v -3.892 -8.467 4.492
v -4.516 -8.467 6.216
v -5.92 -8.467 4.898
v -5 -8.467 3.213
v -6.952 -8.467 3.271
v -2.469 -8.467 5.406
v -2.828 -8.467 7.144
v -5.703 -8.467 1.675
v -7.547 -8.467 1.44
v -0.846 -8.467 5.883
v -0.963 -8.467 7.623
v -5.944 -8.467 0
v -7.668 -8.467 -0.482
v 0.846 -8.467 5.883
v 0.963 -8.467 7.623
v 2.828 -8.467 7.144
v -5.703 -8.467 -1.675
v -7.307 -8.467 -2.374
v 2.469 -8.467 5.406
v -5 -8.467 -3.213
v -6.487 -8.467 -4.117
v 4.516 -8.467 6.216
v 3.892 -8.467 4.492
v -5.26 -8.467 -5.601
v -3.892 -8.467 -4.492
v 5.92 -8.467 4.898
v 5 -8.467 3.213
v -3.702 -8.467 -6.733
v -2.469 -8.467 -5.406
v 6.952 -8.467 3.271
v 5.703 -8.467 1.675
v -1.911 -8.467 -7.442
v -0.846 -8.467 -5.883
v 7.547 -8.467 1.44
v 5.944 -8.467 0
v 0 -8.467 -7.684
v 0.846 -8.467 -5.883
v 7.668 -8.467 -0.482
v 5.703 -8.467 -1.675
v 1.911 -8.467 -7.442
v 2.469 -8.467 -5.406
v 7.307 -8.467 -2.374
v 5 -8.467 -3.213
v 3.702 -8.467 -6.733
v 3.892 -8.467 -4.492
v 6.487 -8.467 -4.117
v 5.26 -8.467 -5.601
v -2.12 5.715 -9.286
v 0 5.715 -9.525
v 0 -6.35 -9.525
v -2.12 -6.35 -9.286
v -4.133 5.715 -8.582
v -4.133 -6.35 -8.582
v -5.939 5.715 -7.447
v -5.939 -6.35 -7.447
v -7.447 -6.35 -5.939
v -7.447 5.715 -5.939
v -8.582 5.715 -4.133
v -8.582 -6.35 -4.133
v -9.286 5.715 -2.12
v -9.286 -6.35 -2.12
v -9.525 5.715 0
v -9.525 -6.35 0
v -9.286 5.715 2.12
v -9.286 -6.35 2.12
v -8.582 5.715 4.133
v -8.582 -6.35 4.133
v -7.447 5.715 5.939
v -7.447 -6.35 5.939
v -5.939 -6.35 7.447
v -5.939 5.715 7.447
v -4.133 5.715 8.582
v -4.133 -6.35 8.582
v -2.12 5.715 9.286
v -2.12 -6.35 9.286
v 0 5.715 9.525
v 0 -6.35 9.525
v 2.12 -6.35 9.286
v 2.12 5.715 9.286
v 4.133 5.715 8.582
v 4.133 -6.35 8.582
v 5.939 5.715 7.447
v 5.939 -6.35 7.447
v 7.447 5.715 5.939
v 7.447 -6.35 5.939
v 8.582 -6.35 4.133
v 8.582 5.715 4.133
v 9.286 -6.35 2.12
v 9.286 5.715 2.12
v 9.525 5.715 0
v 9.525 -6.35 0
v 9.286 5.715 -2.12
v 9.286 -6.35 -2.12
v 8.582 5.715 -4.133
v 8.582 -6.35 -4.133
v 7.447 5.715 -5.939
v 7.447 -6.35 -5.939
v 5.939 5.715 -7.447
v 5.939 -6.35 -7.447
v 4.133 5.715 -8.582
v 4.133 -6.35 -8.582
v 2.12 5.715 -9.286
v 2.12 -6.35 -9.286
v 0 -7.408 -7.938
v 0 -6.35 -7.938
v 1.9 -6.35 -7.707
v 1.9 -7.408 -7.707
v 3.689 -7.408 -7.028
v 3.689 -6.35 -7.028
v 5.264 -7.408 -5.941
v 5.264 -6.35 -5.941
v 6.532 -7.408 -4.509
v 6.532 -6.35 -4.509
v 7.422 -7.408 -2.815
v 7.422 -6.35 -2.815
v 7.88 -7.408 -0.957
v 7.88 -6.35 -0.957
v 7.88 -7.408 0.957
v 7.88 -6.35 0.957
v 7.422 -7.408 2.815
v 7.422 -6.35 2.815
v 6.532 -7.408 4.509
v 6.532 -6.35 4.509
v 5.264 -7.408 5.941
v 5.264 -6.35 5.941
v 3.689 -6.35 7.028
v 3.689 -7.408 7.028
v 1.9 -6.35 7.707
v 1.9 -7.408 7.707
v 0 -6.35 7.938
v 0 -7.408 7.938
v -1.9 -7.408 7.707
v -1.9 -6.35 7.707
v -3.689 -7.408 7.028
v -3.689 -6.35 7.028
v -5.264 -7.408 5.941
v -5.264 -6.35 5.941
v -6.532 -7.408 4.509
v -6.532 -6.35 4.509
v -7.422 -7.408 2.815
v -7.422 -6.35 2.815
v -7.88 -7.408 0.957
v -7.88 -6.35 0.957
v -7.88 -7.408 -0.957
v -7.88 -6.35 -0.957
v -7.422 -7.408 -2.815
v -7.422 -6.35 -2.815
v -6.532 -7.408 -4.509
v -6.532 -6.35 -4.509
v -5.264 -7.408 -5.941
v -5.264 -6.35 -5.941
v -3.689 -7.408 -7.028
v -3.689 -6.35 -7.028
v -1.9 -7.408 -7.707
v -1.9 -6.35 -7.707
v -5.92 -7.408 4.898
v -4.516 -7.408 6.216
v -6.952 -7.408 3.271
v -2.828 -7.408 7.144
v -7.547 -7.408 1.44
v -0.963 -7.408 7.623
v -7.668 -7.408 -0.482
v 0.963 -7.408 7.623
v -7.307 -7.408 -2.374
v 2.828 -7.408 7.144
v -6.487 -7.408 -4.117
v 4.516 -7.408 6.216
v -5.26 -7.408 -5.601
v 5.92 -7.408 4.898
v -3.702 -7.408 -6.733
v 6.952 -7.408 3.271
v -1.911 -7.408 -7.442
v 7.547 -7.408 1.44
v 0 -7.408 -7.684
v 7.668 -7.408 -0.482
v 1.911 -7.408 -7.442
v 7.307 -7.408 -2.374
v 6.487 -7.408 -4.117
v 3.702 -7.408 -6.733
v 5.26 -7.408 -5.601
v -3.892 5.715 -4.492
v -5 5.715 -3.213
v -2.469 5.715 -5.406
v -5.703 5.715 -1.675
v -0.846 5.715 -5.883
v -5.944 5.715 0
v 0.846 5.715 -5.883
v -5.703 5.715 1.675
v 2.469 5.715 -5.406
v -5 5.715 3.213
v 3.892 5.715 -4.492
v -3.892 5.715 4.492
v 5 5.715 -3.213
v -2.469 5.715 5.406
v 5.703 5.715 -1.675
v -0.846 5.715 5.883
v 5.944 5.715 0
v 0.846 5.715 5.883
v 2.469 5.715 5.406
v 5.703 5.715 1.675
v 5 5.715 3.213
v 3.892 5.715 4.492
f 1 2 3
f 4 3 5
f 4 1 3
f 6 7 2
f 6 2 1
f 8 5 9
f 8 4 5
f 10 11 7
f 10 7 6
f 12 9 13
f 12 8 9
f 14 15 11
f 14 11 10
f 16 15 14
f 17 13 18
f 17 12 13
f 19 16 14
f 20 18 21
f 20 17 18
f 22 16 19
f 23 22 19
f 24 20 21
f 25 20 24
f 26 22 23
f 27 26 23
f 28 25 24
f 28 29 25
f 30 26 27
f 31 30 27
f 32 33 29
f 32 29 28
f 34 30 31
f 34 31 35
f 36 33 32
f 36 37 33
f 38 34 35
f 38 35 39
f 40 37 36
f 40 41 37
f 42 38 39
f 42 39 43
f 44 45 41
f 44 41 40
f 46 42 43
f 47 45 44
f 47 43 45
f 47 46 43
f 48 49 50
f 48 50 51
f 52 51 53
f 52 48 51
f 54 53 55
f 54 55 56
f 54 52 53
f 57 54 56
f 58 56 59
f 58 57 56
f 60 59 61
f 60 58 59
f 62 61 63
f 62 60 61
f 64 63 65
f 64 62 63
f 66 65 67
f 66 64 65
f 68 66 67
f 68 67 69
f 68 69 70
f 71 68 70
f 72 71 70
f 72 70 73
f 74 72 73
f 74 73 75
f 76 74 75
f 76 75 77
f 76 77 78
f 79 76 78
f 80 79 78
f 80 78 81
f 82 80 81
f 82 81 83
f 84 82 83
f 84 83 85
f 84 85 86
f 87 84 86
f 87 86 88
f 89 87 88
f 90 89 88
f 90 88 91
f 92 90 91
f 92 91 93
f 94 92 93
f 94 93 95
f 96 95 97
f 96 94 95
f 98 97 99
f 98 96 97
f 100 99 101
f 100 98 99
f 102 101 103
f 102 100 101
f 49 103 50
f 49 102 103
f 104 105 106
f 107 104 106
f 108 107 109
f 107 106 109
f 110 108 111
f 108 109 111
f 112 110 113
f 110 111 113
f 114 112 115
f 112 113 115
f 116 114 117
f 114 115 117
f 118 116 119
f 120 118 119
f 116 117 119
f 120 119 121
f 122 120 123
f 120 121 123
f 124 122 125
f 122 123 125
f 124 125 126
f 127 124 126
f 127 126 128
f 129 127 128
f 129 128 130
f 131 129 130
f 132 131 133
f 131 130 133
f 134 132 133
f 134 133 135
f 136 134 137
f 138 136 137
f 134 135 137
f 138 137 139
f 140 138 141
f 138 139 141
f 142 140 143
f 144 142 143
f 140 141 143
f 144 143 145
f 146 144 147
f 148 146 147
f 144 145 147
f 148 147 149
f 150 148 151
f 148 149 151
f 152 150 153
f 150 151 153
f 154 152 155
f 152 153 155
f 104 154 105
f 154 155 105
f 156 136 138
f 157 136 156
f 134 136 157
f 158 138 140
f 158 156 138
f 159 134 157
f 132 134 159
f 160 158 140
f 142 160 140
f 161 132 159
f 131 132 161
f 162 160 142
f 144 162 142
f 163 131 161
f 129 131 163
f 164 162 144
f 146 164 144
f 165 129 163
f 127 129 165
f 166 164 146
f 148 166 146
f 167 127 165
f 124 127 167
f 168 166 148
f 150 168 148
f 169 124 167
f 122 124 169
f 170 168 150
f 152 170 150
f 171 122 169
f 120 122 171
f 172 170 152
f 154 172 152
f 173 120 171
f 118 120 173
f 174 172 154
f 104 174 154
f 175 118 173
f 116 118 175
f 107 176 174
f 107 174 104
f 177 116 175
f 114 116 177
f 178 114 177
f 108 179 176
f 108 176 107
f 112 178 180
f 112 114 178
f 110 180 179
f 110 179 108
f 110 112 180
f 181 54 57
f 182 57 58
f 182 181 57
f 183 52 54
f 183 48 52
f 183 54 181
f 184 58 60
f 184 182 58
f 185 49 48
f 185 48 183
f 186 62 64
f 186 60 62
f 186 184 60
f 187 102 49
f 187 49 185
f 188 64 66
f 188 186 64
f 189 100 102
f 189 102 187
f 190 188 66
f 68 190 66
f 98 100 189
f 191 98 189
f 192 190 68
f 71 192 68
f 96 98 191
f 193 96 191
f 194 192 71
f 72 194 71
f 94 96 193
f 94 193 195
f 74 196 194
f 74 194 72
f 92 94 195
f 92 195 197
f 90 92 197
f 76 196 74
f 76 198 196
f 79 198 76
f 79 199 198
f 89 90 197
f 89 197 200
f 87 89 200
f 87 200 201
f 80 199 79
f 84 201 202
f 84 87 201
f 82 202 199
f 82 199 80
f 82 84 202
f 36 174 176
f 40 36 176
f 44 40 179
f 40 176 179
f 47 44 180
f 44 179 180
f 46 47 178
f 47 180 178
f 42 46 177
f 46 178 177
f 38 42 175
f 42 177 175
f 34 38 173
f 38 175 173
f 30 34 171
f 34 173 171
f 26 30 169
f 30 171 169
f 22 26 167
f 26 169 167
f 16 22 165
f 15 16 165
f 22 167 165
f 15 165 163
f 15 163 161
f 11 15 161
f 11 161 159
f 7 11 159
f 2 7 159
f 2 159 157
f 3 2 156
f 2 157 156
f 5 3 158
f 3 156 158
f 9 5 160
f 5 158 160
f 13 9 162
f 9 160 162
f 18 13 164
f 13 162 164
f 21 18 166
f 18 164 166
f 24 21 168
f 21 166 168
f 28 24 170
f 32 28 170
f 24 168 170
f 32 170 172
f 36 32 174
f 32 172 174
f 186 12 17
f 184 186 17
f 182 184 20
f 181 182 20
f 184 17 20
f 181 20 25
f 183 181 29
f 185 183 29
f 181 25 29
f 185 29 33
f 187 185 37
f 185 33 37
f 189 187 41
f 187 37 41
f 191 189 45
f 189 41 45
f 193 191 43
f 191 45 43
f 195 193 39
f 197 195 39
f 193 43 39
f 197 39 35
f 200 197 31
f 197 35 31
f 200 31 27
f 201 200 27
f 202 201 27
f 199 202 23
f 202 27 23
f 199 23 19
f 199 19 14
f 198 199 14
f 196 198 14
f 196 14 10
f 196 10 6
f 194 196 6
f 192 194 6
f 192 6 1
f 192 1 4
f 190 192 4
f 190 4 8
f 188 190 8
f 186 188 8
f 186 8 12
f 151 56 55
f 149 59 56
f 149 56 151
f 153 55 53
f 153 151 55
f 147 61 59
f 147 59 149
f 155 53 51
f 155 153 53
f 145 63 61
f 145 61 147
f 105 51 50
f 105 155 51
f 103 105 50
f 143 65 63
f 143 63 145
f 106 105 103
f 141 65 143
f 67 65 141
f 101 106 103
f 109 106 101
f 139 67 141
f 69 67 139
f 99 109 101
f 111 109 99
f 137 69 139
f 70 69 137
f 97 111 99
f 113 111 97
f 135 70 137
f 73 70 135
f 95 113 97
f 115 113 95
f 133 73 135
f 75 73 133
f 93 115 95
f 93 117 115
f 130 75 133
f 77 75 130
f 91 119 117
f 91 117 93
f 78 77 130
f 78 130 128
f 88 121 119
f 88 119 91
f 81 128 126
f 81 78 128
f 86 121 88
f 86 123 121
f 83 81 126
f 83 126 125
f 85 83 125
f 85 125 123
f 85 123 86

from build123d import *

# Parameters (mm, degrees)
SKETCH1_R                    = 9.525
BOSS_EXTRUDE1_DEPTH          = 5.715
BOSS_EXTRUDE2_DEPTH          = 6.35
SKETCH3_R                    = 7.9375
BOSS_EXTRUDE3_DEPTH          = 1.058333333
SKETCH4_R                    = 7.6835
BOSS_EXTRUDE4_DEPTH          = 1.058333333
F_1_4_18_NPSM_TAPPED_HOLE2_D = 11.8872
SKETCH11_R                   = 10.998522628
SKETCH11_R_2                 = 9.525
CUT_EXTRUDE1_DEPTH           = 21.317795019


with BuildPart() as part:
    # Sketch1 → Boss-Extrude1 (new body)
    with BuildSketch(Plane(origin=(0, 0, 0), x_dir=(1, 0, 0), z_dir=(0, 1, 0))):
        with Locations(Location((0, 0, 0), (0, 0, 270))):
            Circle(SKETCH1_R)
    extrude(amount=BOSS_EXTRUDE1_DEPTH)

    # Sketch2 → Boss-Extrude2 (add)
    with BuildSketch(Plane.XZ):
        Polygon((0, -10.998522628), (9.525, -5.499261314), (9.525, 5.499261314), (0, 10.998522628), (-9.525, 5.499261314), (-9.525, -5.499261314), align=None)
    extrude(amount=BOSS_EXTRUDE2_DEPTH)

    # Sketch3 → Boss-Extrude3 (add)
    with BuildSketch(Plane.XZ.offset(6.35)):
        with Locations(Location((0, 0, 0), (0, 0, 270))):
            Circle(SKETCH3_R)
    extrude(amount=BOSS_EXTRUDE3_DEPTH)

    # Sketch4 → Boss-Extrude4 (add)
    with BuildSketch(Plane.XZ.offset(7.408333333)):
        with Locations(Location((0, 0, 0), (0, 0, 270))):
            Circle(SKETCH4_R)
    extrude(amount=BOSS_EXTRUDE4_DEPTH)

    # 1/4-18 NPSM Tapped Hole2 (through all)
    with Locations(Plane(origin=(0, 5.715, 0), x_dir=(1, 0, 0), z_dir=(0, 1, 0))):
        with Locations((0, 0)):
            Hole(F_1_4_18_NPSM_TAPPED_HOLE2_D / 2)

    # Sketch11 → Cut-Extrude1 (cut, through all)
    with BuildSketch(Plane(origin=(0, 5.715, 0), x_dir=(1, 0, 0), z_dir=(0, 1, 0))):
        Circle(SKETCH11_R)
        with Locations(Location((0, 0, 0), (0, 0, 90))):
            Circle(SKETCH11_R_2, mode=Mode.SUBTRACT)
    extrude(amount=-CUT_EXTRUDE1_DEPTH, mode=Mode.SUBTRACT)


solid = part.part
